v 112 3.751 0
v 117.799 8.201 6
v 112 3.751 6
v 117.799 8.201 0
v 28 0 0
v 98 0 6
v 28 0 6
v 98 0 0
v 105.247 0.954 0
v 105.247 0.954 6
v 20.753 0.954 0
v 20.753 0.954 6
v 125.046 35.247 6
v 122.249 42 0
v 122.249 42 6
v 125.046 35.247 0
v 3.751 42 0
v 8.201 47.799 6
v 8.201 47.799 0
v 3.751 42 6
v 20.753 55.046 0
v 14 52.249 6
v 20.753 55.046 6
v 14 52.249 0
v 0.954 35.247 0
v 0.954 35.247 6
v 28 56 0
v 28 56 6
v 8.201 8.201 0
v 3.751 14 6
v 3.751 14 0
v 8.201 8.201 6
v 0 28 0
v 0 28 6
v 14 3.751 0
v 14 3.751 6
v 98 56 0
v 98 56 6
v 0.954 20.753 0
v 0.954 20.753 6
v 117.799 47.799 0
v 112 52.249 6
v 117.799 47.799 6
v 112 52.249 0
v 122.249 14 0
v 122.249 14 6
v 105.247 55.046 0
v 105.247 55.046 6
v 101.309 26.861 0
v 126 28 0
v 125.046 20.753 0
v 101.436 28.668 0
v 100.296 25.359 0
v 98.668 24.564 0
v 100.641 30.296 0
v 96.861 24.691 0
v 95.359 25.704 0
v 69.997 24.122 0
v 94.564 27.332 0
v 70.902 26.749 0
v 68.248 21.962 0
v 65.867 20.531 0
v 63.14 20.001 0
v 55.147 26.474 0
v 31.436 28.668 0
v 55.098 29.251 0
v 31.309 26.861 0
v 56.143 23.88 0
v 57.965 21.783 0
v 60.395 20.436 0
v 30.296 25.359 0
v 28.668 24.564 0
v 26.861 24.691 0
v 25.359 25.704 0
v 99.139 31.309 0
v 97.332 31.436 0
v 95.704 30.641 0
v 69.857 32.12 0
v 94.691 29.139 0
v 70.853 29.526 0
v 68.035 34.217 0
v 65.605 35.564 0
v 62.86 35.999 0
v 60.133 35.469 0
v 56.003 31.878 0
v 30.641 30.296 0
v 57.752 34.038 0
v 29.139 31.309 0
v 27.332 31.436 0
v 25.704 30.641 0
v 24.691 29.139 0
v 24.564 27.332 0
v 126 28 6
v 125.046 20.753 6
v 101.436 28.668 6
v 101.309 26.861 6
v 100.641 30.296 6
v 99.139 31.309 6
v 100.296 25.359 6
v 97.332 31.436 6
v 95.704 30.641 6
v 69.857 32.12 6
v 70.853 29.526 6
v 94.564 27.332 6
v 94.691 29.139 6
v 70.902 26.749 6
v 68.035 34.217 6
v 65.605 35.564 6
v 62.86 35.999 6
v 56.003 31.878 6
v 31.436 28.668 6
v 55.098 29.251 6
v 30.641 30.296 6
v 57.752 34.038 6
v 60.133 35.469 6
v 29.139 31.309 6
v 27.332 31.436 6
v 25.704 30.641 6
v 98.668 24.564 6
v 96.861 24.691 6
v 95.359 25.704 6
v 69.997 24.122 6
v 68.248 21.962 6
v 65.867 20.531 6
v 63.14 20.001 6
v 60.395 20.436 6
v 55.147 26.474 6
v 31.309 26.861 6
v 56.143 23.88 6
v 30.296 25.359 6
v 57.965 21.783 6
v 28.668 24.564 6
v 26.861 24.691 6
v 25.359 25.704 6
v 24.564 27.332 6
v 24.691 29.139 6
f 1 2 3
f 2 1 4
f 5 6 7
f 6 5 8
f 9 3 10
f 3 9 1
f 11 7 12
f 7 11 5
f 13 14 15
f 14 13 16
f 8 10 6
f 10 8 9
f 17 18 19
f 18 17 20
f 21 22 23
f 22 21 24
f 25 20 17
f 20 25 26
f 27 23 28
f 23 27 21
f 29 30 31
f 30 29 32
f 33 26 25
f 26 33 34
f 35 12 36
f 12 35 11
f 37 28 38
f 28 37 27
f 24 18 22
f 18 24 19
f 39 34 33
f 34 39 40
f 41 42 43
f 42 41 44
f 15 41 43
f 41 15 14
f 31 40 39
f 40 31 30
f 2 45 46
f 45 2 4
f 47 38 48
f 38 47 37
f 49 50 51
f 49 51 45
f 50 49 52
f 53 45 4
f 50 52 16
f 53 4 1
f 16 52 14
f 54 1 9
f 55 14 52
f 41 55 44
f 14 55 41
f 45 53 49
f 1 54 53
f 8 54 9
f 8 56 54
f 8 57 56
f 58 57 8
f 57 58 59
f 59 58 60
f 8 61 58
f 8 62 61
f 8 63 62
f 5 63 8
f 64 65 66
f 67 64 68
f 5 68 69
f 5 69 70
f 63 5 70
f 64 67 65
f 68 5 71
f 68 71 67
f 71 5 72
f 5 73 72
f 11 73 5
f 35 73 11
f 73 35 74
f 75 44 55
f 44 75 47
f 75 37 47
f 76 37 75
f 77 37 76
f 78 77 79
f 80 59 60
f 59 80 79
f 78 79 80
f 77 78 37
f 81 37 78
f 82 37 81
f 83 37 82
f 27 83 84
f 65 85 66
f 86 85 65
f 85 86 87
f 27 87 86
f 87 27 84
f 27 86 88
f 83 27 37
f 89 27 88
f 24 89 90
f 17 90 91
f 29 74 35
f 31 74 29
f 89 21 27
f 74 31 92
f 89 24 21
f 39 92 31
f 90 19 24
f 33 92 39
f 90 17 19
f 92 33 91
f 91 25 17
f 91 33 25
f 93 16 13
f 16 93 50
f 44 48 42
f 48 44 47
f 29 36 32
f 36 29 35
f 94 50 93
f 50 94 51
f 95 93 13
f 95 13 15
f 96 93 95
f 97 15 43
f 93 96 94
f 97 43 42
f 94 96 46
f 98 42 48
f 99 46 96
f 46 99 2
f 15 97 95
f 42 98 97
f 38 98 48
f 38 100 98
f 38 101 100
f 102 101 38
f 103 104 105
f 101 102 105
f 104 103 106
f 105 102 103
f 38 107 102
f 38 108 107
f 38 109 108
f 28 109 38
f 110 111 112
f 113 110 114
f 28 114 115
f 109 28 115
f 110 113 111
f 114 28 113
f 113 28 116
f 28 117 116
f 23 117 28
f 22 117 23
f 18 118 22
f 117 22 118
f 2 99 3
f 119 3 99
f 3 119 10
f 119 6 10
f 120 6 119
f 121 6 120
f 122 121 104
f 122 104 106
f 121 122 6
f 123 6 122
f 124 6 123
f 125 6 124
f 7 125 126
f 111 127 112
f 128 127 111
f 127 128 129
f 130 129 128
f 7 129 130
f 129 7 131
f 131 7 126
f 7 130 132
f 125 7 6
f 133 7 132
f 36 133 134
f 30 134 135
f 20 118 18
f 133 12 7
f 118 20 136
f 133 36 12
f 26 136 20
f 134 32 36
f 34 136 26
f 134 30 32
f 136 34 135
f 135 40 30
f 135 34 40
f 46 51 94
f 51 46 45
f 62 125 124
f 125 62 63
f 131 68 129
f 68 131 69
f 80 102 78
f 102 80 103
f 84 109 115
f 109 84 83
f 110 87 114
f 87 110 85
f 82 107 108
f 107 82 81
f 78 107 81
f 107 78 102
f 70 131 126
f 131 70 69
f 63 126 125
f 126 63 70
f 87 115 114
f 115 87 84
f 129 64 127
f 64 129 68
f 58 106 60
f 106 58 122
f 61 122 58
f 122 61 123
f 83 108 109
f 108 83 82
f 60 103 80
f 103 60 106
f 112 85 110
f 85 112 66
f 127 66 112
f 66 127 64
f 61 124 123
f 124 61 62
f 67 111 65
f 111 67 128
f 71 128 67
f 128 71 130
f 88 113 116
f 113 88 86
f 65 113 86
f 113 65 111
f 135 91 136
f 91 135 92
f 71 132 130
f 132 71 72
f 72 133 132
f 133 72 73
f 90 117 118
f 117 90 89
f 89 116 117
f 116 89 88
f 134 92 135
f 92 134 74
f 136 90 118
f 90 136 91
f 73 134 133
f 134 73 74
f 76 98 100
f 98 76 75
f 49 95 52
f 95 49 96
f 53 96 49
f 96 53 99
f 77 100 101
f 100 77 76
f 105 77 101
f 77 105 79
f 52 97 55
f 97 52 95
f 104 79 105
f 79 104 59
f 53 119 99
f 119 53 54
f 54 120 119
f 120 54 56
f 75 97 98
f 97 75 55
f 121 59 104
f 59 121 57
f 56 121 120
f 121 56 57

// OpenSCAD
$fn = 32;

// ----------------------------------------------------------------------
// Spacer plate: obround span 70, caps R28
// ----------------------------------------------------------------------

// --- parameters (mm) ---
bore_r = 8;               // centre bore radius
bolt_r = 3.5;             // bolt hole radius
plate_t = 6;              // plate thickness, Z (extrusion height)
span = 70;                // obround span
cap_r = 28;               // cap radius

profile = [[28, 56], [20.753, 55.046], [14, 52.249], [8.201, 47.799], [3.751, 42], [0.954, 35.247], [0, 28], [0.954, 20.753], [3.751, 14], [8.201, 8.201], [14, 3.751], [20.753, 0.954], [28, 0], [98, 0], [105.247, 0.954], [112, 3.751], [117.799, 8.201], [122.249, 14], [125.046, 20.753], [126, 28], [125.046, 35.247], [122.249, 42], [117.799, 47.799], [112, 52.249], [105.247, 55.046], [98, 56]];  // primary outline, 26 points, counter clockwise
void_1 = [[70.853, 29.526], [69.857, 32.12], [68.035, 34.217], [65.605, 35.564], [62.86, 35.999], [60.133, 35.469], [57.752, 34.038], [56.003, 31.878], [55.098, 29.251], [55.147, 26.474], [56.143, 23.88], [57.965, 21.783], [60.395, 20.436], [63.14, 20.001], [65.867, 20.531], [68.248, 21.962], [69.997, 24.122], [70.902, 26.749]];  // centre bore, 18 points
void_2 = [[31.436, 28.668], [30.641, 30.296], [29.139, 31.309], [27.332, 31.436], [25.704, 30.641], [24.691, 29.139], [24.564, 27.332], [25.359, 25.704], [26.861, 24.691], [28.668, 24.564], [30.296, 25.359], [31.309, 26.861]];  // end hole, 12 points
void_3 = [[101.436, 28.668], [100.641, 30.296], [99.139, 31.309], [97.332, 31.436], [95.704, 30.641], [94.691, 29.139], [94.564, 27.332], [95.359, 25.704], [96.861, 24.691], [98.668, 24.564], [100.296, 25.359], [101.309, 26.861]];  // end hole, 12 points

// --- the one profile operation ---
difference() {
  linear_extrude(height = plate_t) polygon(points = profile);
  translate([0, 0, -1])
    linear_extrude(height = plate_t + 2) polygon(points = void_1);
  translate([0, 0, -1])
    linear_extrude(height = plate_t + 2) polygon(points = void_2);
  translate([0, 0, -1])
    linear_extrude(height = plate_t + 2) polygon(points = void_3);
}
